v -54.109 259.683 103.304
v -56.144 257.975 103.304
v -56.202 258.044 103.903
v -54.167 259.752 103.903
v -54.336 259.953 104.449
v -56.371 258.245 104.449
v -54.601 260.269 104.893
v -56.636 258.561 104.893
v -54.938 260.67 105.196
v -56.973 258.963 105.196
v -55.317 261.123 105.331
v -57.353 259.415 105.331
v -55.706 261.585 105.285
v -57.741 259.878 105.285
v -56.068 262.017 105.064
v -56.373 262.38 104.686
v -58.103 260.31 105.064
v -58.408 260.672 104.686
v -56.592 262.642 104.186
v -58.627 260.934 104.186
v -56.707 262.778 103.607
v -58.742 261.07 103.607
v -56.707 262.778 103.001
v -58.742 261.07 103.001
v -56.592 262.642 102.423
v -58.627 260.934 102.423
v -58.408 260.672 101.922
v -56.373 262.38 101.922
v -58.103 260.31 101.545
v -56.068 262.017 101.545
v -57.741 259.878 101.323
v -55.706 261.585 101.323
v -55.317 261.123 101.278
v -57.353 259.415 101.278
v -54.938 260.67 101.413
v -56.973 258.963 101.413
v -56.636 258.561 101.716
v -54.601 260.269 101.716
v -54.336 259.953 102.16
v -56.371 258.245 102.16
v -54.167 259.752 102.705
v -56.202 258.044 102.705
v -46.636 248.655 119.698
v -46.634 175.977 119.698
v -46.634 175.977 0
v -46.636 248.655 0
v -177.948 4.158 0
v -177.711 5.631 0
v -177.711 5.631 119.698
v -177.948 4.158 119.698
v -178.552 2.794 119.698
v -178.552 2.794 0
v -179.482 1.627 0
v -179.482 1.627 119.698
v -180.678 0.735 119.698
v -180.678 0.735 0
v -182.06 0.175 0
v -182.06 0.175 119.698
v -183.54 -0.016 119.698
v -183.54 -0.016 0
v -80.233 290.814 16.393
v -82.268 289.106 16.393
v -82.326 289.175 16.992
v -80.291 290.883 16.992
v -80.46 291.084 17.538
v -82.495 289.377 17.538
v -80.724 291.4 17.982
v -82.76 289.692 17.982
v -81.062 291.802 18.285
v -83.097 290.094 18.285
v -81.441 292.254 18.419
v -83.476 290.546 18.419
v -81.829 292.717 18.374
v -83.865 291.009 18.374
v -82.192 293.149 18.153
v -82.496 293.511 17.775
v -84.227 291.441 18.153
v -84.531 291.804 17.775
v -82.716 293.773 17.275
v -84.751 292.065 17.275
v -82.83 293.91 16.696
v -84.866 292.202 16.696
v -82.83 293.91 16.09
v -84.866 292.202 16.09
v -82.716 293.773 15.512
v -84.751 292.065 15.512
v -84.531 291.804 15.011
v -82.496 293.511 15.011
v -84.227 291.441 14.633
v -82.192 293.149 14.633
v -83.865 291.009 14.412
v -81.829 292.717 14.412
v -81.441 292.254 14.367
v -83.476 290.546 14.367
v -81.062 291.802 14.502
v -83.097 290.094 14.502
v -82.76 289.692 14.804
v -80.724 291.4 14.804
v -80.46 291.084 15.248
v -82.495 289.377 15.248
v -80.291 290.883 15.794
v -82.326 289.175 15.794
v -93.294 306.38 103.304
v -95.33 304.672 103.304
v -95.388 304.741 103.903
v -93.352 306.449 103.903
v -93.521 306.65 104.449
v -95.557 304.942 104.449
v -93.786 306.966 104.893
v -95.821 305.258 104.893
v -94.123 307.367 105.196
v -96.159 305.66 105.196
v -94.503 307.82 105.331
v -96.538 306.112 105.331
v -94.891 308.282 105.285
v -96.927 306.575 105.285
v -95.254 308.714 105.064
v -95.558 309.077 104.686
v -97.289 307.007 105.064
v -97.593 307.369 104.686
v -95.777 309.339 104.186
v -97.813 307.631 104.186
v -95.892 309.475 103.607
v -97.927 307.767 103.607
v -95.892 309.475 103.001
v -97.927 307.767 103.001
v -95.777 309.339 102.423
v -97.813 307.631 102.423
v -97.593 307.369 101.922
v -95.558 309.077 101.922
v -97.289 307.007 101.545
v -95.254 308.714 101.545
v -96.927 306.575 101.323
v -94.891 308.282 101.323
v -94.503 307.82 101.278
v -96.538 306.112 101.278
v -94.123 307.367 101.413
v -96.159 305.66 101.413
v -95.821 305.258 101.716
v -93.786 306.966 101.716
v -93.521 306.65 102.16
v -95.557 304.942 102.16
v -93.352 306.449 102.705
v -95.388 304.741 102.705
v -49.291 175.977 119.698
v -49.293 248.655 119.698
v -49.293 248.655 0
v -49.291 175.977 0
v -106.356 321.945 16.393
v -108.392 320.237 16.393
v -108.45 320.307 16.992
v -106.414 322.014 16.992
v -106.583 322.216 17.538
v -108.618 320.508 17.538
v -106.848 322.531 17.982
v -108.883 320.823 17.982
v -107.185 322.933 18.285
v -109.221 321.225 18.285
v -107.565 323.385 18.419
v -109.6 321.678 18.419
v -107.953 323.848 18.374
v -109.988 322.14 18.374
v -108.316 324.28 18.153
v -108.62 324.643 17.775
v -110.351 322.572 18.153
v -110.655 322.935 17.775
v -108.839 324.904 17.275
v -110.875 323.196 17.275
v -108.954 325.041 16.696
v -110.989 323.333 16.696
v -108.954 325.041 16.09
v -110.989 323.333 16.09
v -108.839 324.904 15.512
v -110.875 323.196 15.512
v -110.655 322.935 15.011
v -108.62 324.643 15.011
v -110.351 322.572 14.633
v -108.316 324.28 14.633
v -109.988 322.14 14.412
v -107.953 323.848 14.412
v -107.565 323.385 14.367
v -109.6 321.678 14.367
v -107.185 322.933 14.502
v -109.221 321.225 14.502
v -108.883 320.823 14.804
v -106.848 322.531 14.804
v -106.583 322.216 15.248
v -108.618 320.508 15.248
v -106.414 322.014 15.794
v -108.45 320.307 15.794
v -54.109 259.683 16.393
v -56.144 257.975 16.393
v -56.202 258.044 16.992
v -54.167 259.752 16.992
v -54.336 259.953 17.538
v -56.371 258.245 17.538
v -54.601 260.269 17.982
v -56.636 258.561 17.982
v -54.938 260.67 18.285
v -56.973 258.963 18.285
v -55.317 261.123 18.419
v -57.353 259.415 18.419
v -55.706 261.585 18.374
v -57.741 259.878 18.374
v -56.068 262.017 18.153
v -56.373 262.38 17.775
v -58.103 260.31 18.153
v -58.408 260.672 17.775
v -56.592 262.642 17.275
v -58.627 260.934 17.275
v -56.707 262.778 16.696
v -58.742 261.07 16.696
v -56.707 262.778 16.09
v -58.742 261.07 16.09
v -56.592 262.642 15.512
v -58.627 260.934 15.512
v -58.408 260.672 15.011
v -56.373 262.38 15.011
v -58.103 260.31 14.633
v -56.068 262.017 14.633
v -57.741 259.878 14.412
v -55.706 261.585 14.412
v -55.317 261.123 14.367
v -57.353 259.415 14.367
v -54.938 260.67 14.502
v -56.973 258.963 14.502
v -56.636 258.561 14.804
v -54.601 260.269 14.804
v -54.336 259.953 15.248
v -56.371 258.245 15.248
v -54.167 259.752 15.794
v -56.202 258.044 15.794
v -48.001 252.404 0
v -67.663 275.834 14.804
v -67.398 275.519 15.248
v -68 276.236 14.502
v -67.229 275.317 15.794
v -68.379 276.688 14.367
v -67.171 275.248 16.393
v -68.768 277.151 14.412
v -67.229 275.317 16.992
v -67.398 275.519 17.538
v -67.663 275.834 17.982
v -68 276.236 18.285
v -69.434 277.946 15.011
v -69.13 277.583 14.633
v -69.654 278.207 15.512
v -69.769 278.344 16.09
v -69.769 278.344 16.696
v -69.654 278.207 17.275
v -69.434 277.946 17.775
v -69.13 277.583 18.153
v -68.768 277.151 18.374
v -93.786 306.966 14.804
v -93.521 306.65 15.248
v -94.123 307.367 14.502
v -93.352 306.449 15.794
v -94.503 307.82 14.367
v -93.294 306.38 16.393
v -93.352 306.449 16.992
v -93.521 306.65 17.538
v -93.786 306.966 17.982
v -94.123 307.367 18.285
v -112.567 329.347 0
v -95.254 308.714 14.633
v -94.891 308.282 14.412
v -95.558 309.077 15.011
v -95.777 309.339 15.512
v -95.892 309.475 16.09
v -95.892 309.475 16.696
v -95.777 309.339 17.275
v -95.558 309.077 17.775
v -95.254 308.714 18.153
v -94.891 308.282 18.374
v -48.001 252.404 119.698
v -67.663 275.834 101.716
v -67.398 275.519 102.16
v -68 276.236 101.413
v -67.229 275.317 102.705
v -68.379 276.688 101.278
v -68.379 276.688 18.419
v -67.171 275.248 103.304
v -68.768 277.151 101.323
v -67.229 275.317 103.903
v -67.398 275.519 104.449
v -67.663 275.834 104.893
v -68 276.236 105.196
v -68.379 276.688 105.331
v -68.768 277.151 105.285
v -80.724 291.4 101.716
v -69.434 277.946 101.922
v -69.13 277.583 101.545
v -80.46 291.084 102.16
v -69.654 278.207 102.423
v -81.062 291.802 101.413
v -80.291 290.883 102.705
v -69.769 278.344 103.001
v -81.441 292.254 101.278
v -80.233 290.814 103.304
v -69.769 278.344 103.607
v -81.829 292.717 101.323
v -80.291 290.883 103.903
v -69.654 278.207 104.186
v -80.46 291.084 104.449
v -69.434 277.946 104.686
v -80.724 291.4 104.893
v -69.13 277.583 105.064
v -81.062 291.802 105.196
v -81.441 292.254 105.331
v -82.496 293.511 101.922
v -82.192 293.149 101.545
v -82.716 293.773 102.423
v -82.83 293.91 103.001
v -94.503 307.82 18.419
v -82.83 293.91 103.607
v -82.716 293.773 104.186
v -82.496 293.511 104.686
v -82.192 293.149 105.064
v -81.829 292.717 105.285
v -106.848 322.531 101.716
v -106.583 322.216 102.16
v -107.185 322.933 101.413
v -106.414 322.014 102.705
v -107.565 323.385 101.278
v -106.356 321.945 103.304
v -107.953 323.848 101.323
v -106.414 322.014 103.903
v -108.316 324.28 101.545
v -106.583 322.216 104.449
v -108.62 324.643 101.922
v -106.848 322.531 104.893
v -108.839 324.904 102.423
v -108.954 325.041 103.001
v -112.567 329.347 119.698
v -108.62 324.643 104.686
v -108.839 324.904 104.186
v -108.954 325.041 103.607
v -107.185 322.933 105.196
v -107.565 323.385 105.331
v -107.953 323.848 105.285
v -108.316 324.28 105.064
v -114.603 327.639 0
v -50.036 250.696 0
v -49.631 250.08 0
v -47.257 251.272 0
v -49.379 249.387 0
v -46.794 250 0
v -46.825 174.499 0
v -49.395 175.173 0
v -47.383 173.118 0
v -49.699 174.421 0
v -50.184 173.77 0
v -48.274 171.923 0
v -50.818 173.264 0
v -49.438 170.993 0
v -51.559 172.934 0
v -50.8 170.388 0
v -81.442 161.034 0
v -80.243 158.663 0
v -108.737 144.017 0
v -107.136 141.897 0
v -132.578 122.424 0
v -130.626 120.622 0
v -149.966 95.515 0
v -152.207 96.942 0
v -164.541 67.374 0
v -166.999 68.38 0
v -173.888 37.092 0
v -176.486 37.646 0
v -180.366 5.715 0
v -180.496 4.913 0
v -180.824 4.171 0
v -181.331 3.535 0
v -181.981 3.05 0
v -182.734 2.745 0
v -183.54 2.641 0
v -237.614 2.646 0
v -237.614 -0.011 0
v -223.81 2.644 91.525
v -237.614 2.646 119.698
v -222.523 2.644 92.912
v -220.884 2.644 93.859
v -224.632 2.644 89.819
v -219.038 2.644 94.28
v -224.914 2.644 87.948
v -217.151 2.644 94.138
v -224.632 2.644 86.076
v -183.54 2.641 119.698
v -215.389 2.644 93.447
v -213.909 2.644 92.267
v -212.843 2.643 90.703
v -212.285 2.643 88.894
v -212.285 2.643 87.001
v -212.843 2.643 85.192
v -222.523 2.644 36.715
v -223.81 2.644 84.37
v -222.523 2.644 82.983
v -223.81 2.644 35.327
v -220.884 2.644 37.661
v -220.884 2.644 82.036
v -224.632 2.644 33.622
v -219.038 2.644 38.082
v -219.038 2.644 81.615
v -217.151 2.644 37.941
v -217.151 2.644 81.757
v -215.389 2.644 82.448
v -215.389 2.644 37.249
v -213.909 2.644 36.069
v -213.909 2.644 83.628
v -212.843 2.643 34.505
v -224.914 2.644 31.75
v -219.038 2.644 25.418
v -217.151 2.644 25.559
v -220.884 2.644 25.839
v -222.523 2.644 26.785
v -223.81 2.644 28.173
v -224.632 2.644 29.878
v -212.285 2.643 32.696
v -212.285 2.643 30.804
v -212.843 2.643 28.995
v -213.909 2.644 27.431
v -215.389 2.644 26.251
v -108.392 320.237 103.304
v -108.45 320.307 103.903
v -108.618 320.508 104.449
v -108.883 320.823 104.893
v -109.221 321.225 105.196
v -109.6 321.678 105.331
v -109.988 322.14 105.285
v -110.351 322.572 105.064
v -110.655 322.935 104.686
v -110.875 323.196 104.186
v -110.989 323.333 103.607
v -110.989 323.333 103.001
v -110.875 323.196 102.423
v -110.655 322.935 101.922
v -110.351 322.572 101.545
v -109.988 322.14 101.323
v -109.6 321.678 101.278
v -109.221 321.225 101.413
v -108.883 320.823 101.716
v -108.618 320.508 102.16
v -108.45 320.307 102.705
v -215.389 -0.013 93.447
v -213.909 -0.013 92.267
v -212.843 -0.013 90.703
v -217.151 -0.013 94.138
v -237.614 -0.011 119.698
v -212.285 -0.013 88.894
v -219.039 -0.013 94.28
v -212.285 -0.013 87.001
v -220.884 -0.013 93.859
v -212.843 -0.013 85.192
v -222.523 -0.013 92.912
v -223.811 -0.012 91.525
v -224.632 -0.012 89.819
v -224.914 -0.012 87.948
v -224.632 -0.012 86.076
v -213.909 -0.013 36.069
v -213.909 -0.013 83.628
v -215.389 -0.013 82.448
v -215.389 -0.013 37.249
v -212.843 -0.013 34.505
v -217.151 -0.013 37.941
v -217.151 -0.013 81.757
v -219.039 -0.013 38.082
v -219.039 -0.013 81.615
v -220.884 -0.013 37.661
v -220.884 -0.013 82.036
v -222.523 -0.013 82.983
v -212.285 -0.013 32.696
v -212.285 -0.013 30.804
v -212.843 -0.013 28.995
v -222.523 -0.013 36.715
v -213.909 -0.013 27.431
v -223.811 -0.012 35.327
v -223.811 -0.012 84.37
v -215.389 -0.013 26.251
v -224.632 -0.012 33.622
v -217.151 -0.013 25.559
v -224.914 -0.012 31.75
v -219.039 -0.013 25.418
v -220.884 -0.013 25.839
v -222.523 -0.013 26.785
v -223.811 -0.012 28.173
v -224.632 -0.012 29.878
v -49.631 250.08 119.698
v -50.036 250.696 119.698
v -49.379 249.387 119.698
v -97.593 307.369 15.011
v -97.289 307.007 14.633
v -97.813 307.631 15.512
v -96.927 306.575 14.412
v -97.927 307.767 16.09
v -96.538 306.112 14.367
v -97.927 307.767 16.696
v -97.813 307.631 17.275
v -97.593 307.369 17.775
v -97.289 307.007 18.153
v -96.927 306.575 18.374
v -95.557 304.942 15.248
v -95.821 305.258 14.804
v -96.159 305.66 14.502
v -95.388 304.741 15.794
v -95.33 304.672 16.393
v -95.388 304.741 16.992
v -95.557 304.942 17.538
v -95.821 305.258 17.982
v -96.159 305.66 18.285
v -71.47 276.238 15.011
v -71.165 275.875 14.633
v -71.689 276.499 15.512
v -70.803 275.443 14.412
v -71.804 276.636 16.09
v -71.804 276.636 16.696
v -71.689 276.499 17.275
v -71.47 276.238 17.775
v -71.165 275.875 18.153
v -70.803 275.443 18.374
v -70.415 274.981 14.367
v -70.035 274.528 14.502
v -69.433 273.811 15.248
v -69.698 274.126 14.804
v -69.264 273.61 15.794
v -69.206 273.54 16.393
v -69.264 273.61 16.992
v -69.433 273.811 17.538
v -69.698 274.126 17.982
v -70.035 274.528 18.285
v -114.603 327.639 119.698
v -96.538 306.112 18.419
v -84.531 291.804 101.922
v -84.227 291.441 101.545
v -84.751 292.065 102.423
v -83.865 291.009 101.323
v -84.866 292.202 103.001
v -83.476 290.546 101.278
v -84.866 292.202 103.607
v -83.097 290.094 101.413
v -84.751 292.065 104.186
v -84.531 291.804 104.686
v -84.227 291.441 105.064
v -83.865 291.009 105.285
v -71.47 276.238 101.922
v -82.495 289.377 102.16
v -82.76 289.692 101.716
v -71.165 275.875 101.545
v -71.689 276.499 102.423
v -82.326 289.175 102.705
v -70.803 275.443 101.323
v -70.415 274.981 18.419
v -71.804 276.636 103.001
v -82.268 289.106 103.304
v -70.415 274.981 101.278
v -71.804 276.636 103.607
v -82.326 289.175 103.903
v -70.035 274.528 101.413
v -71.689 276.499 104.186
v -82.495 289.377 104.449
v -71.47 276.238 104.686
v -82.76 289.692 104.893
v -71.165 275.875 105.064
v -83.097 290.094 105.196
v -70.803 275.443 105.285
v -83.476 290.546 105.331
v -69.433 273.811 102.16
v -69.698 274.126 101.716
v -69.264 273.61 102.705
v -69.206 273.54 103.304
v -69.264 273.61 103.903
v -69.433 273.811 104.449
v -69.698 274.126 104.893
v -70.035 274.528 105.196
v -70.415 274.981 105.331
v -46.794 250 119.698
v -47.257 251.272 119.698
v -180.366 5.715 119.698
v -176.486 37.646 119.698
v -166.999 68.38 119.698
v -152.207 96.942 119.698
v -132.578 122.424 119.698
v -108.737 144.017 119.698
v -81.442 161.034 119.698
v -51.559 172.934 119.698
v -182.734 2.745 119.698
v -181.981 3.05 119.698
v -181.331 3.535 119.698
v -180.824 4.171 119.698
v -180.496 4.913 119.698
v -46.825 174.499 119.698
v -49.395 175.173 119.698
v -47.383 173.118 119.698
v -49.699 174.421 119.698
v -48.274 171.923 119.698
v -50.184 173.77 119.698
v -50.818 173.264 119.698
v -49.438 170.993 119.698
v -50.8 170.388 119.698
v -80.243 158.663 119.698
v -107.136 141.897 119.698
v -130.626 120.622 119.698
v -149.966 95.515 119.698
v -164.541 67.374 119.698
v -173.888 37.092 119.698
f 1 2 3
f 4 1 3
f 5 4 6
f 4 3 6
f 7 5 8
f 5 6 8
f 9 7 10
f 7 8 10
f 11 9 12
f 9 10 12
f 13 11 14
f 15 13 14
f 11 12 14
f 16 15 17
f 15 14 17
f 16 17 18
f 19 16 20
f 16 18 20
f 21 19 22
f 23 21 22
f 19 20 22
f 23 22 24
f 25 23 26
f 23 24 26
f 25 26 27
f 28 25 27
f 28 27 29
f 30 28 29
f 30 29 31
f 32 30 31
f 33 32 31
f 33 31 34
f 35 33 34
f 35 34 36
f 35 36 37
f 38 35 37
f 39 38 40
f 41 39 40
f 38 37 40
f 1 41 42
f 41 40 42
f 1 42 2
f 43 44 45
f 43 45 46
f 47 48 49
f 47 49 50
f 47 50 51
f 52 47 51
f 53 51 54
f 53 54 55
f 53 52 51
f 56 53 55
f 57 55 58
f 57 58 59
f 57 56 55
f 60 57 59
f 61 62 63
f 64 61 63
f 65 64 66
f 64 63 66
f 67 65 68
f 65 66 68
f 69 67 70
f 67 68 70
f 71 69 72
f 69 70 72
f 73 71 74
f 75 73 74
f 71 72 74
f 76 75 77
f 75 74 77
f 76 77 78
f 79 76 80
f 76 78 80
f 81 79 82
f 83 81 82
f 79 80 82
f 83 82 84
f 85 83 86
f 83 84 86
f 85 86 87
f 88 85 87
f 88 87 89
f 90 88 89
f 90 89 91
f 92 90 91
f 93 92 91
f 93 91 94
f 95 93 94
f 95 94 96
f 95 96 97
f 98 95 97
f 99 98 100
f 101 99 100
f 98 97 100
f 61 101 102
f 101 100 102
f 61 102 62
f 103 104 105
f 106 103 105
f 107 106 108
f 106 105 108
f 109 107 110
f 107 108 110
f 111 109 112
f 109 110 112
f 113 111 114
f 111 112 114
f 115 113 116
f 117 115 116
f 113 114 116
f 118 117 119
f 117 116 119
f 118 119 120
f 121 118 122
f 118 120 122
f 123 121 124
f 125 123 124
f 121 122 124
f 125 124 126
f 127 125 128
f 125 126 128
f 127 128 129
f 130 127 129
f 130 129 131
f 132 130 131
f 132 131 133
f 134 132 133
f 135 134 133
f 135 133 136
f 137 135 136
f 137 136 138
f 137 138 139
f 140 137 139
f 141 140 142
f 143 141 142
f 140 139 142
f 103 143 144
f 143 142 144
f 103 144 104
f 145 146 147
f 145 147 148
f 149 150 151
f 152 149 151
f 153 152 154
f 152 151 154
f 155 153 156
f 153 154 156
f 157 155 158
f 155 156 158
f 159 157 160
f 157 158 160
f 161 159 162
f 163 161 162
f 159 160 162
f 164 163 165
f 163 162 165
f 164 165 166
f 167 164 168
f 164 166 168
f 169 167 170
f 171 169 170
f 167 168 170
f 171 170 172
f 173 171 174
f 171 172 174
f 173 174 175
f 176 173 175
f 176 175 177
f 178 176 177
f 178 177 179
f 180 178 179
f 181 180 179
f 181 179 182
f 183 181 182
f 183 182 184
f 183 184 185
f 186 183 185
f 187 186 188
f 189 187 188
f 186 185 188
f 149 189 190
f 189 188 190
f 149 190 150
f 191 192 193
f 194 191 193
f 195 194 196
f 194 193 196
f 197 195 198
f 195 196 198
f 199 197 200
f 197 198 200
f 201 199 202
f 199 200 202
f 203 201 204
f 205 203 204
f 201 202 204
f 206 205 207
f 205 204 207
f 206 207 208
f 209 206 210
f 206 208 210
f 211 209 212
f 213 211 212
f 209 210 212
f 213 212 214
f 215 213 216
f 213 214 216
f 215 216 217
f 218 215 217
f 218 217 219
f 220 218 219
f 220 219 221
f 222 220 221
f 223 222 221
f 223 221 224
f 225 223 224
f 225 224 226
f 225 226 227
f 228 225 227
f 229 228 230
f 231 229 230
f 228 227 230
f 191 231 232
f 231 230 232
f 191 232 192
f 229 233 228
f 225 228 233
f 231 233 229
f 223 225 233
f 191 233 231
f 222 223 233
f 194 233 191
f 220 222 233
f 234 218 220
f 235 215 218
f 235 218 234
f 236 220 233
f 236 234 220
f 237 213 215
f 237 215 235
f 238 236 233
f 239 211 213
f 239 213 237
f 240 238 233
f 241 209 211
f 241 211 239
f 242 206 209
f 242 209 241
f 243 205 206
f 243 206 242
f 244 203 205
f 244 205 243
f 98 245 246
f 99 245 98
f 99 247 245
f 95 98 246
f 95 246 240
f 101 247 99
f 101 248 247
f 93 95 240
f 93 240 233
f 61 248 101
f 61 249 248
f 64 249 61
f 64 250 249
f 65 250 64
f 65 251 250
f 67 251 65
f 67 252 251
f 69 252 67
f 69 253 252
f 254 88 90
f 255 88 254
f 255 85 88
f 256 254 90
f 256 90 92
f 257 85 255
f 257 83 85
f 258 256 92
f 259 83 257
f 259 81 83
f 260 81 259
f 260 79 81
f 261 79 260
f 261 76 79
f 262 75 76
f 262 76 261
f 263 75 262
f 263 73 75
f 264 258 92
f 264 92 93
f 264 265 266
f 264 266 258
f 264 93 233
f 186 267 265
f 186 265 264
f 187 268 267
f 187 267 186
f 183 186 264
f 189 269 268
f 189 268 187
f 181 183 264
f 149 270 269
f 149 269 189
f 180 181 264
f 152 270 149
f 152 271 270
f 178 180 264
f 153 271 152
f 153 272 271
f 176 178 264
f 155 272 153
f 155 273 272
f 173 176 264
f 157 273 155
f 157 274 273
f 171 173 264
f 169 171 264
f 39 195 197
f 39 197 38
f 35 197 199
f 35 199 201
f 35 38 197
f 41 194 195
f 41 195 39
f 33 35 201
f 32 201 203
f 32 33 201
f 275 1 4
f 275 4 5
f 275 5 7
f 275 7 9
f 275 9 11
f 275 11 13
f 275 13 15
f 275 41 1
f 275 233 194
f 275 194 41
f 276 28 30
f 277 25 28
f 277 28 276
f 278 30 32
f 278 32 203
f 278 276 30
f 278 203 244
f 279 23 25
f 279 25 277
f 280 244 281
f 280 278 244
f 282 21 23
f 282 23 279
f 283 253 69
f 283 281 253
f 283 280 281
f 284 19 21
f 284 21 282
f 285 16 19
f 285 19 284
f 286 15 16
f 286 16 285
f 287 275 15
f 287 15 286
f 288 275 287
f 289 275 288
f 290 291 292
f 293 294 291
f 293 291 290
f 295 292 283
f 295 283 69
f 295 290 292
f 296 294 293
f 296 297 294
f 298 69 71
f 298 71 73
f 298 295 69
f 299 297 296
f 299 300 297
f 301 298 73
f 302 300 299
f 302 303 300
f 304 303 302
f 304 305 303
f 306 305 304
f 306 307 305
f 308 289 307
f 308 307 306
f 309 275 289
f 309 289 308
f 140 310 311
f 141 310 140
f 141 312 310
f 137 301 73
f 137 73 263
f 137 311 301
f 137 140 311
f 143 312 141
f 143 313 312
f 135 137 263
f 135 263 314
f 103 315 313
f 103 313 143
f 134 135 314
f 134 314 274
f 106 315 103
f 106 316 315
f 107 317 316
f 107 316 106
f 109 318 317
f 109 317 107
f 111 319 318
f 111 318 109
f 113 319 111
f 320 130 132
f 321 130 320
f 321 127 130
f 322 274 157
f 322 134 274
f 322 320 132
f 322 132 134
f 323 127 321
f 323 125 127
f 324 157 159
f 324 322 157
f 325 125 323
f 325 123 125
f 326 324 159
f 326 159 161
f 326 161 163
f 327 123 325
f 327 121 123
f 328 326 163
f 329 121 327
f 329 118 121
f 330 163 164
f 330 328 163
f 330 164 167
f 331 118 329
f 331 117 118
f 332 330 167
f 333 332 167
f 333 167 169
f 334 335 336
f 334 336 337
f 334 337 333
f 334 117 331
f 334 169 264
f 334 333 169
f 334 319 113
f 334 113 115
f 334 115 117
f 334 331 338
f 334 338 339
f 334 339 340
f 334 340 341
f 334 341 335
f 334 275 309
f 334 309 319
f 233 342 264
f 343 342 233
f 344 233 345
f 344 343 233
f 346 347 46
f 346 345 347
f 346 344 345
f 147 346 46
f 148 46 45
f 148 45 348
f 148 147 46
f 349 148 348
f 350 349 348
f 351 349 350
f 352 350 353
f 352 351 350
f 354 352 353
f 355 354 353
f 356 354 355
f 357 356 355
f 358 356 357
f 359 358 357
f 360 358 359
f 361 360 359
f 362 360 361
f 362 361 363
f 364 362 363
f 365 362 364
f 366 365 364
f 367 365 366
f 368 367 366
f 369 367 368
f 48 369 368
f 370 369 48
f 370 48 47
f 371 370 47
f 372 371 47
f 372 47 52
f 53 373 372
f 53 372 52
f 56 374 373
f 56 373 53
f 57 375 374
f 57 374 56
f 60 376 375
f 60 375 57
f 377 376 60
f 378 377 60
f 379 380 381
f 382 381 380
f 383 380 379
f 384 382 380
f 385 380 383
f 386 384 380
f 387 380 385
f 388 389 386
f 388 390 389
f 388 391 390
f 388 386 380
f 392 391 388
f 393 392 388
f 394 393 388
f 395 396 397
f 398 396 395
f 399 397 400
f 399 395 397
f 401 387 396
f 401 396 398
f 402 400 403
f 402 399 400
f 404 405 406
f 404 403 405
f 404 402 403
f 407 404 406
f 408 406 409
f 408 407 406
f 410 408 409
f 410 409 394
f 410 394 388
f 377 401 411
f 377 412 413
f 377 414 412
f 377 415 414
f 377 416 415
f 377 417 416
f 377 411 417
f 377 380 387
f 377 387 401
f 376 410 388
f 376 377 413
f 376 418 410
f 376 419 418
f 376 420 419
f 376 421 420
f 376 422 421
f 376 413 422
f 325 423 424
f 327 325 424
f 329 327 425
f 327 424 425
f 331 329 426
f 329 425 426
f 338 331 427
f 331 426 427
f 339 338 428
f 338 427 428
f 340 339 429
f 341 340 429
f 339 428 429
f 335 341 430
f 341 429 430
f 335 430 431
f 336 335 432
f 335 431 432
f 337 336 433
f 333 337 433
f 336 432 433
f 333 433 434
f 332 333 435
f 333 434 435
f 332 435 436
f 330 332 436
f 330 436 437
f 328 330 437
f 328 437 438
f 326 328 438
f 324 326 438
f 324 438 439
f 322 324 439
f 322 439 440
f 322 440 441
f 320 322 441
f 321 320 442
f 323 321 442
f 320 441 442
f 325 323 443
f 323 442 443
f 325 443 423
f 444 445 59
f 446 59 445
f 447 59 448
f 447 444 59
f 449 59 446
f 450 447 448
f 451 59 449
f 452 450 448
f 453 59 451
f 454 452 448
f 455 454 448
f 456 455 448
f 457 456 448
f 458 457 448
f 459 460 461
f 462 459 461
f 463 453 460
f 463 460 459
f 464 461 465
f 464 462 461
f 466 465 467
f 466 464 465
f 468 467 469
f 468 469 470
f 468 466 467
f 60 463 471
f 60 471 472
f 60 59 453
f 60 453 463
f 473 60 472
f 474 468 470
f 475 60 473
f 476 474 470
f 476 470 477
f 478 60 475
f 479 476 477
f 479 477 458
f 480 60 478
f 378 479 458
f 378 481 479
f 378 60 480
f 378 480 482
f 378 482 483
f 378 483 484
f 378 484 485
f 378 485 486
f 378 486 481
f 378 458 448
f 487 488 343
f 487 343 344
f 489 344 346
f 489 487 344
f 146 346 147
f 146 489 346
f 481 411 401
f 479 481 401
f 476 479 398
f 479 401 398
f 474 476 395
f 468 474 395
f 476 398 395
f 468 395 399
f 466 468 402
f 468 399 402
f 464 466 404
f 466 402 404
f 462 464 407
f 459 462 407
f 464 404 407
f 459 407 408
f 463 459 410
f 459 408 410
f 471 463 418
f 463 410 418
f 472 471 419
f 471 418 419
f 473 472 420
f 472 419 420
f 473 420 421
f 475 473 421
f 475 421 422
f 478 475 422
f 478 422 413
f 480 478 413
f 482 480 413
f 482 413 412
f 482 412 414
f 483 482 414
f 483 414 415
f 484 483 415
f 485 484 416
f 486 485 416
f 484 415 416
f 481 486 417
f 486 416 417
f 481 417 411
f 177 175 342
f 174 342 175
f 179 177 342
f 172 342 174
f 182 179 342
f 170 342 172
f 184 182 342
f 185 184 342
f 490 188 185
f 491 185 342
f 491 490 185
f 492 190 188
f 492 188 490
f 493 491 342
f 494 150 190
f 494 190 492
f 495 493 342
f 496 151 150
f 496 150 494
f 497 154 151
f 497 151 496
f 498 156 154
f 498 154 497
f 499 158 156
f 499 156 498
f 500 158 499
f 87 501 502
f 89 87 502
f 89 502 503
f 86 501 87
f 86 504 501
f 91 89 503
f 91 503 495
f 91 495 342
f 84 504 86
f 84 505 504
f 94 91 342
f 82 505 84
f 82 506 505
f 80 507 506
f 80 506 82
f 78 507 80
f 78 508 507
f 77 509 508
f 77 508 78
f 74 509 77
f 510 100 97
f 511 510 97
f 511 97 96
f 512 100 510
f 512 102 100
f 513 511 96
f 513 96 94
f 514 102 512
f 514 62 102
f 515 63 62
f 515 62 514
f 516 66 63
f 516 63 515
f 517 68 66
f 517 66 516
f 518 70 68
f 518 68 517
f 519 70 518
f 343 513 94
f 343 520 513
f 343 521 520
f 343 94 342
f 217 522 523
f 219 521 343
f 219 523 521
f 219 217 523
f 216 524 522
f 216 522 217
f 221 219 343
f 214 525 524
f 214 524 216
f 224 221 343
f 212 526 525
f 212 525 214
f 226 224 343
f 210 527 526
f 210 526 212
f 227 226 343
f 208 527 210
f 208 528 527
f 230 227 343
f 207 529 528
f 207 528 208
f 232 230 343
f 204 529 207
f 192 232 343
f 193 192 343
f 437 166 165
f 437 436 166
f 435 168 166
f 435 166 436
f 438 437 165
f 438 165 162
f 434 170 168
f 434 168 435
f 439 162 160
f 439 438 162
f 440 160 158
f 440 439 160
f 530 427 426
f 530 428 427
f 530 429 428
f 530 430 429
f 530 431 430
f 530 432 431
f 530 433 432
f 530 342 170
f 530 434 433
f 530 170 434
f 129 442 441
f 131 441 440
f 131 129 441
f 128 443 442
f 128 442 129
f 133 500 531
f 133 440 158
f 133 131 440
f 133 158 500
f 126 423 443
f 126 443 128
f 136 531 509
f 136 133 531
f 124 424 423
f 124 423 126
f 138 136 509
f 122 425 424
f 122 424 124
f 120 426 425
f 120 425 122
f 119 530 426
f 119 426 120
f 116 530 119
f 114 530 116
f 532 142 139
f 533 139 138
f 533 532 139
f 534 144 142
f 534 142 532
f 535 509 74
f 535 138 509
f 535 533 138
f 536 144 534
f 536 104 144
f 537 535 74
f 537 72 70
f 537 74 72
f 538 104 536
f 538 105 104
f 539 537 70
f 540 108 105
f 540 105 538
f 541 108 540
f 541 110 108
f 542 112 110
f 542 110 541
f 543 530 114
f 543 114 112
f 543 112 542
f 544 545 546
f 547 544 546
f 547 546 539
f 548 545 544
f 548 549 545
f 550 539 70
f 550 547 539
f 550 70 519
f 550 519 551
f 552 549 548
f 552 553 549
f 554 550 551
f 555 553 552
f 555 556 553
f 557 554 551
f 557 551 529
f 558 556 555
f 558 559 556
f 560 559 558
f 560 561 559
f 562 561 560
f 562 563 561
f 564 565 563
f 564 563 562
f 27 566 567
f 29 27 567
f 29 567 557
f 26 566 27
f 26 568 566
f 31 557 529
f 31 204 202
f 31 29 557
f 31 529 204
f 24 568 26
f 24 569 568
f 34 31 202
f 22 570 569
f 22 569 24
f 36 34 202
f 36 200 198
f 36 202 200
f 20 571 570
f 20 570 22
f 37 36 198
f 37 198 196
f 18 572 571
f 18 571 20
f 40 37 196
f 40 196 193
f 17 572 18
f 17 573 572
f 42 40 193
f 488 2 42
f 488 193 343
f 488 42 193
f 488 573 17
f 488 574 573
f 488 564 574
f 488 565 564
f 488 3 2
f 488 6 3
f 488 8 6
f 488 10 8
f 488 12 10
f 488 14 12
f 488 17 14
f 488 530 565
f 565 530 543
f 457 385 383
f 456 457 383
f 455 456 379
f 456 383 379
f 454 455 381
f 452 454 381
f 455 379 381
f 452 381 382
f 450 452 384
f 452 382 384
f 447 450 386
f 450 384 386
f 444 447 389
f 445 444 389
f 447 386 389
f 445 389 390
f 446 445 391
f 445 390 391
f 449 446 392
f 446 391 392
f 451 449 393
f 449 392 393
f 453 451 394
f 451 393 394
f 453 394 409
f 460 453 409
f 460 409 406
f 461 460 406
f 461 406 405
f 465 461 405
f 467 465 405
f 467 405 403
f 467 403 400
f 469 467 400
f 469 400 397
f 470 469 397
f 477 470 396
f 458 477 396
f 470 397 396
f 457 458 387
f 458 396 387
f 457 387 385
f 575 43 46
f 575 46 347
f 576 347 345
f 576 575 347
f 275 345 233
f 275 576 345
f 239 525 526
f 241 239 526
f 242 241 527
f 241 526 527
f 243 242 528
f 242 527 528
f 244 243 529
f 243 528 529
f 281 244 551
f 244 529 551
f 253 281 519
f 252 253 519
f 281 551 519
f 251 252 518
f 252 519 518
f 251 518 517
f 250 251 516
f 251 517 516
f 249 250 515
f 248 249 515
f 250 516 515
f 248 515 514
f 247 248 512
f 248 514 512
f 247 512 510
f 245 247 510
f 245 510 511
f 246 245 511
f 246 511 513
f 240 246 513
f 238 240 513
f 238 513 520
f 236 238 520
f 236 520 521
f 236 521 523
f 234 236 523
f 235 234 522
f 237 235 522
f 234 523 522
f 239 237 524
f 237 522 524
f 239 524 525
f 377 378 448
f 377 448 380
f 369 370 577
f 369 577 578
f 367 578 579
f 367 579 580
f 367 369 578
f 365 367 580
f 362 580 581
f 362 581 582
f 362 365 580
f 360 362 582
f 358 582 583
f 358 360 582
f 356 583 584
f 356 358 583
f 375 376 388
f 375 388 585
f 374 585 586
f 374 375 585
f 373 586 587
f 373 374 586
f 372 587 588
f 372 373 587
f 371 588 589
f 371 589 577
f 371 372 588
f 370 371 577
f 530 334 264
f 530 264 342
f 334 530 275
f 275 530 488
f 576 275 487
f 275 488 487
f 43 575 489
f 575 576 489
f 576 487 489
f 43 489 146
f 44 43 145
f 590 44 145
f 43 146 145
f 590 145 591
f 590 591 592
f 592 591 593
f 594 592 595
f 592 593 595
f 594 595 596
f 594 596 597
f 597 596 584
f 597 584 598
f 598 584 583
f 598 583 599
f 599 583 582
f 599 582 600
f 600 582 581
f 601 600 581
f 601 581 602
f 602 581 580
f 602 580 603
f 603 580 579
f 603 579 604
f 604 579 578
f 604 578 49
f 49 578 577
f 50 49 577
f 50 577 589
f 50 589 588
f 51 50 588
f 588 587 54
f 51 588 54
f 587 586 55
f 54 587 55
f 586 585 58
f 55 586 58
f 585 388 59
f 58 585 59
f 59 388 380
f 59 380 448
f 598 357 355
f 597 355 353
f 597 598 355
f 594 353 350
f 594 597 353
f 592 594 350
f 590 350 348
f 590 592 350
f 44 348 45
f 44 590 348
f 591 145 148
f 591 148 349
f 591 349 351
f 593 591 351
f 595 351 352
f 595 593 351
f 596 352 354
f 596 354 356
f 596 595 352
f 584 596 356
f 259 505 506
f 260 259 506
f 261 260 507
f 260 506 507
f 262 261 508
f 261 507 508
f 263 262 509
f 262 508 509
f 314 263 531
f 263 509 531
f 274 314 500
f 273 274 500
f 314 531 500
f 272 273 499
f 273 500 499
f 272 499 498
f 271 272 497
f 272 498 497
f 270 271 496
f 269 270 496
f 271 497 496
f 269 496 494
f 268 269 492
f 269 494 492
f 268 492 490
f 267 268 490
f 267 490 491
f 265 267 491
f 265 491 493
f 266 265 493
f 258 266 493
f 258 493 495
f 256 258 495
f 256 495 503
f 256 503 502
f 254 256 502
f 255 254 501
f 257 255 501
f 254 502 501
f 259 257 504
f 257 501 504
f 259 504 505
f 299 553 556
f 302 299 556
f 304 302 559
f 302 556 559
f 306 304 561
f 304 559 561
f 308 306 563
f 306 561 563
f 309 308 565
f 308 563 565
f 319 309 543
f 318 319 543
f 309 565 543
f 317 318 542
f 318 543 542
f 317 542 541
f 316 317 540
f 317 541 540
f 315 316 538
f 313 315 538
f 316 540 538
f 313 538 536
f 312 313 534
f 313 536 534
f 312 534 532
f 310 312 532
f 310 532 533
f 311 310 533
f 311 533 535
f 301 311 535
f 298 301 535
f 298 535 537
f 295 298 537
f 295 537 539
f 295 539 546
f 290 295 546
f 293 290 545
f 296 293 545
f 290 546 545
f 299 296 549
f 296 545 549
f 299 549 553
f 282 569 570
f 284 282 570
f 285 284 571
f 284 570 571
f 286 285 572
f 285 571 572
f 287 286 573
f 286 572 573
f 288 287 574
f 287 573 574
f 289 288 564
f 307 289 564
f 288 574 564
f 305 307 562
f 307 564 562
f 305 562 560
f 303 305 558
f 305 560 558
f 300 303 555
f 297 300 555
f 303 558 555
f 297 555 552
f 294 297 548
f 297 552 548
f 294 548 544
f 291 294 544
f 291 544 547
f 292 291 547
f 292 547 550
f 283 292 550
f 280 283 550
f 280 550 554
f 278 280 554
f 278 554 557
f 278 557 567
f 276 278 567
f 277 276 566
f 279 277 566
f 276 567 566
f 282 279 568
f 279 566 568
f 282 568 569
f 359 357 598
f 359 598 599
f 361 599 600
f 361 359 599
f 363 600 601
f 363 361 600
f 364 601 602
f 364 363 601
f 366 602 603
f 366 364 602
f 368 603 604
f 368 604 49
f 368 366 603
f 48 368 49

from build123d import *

# Parameters (mm, degrees)
BASE_FLANGE1_DEPTH           = 119.6975
EDGE_FLANGE1_DEPTH           = 119.6975
EDGE_FLANGE2_STRIP_CUT_DEPTH = 119.6975
EDGE_FLANGE2_DEPTH           = 119.6975
EDGE_FLANGE3_DEPTH           = 119.6975
SKETCH20_R                   = 6.35
CUT_EXTRUDE1_DEPTH           = 2.65684
SKETCH21_R                   = 2.032
CUT_EXTRUDE2_DEPTH           = 2.65684


# Sheet-metal steps are written as plain solids
with BuildPart() as part:
    # Sketch1 → Base-Flange1 (new body)
    with BuildSketch(Plane.XY):
        with BuildLine():
            ThreePointArc((-50.8, 170.388379885), (-140.856418383, 108.500273734), (-177.710803869, 5.63118))
            Line((-177.710803869, 5.63118), (-180.366311024, 5.715325918))
            ThreePointArc((-180.366311024, 5.715325918), (-142.961215721, 110.121577824), (-51.559097143, 172.934469105))
            Line((-51.559097143, 172.934469105), (-50.8, 170.388379885))
        make_face()
    extrude(amount=BASE_FLANGE1_DEPTH)

    # Edge-Flange1 section (across the edge) → Edge-Flange1 (add)
    with BuildSketch(Plane(origin=(-49.291175996, 173.610632552, 119.6975), x_dir=(-0.9999999996342678, -2.7045604981568168e-05, 0), z_dir=(0, 0, -1))):
        with BuildLine():
            Line((-2.65684, 2.366572064), (-2.65684, 76.2))
            Line((-2.65684, 76.2), (0, 76.2))
            Line((0, 76.2), (0, 2.366572064))
            ThreePointArc((0, 2.366572064), (0.62936233, 0.469112223), (2.267939433, -0.676102109))
            Line((2.267939433, -0.676102109), (1.508911151, -3.222211858))
            ThreePointArc((1.508911151, -3.222211858), (-1.500827273, -1.118682173), (-2.65684, 2.366572064))
        make_face()
    extrude(amount=EDGE_FLANGE1_DEPTH)

    # Edge-Flange2 strip (across the edge) → Edge-Flange2 strip cut (cut)
    with BuildSketch(Plane(origin=(-49.293236871, 249.810632524, 119.6975), x_dir=(-0.7660270582590358, -0.6428083275868537, 0), z_dir=(0, 0, -1))):
        Polygon((-12.205285278, 10.412383287), (-1.292448625, -2.593029), (0.742808893, -0.885245167), (-10.17002776, 12.12016712), align=None)
    extrude(amount=EDGE_FLANGE2_STRIP_CUT_DEPTH, mode=Mode.SUBTRACT)

    # Edge-Flange2 section (across the edge) → Edge-Flange2 (add)
    with BuildSketch(Plane(origin=(-49.293236871, 249.810632524, 119.6975), x_dir=(-0.7660270582590358, -0.6428083275868537, 0), z_dir=(0, 0, -1))):
        with BuildLine():
            Line((-2.65684, 1.155605494), (-2.65684, 101.6))
            Line((-2.65684, 101.6), (0, 101.6))
            Line((0, 101.6), (0, 1.155605494))
            ThreePointArc((0, 1.155605494), (0.191475929, 0.069691539), (0.742808893, -0.885245167))
            Line((0.742808893, -0.885245167), (-1.292448625, -2.593029))
            ThreePointArc((-1.292448625, -2.593029), (-2.305137014, -0.839001259), (-2.65684, 1.155605494))
        make_face()
    extrude(amount=EDGE_FLANGE2_DEPTH)

    # Edge-Flange3 section (across the edge) → Edge-Flange3 (add)
    with BuildSketch(Plane(origin=(-180.463740314, 2.640617339, 0), x_dir=(8.626632785421055e-05, 0.9999999962790604, 0), z_dir=(0, 0, 1))):
        with BuildLine():
            Line((-2.65684, 3.076251829), (-2.65684, 57.15))
            Line((-2.65684, 57.15), (0, 57.15))
            Line((0, 57.15), (0, 3.076251829))
            ThreePointArc((0, 3.076251829), (0.894756196, 0.86692768), (3.074716973, -0.097164046))
            Line((3.074716973, -0.097164046), (2.990800136, -2.75267845))
            ThreePointArc((2.990800136, -2.75267845), (-1.013351819, -0.981834768), (-2.65684, 3.076251829))
        make_face()
    extrude(amount=EDGE_FLANGE3_DEPTH)

    # Sketch20 → Cut-Extrude1 (cut)
    with BuildSketch(Plane(origin=(0.000226453, 2.625049375, 0), x_dir=(0.9999999962790604, -8.626632785420363e-05, 0), z_dir=(8.626632785420363e-05, 0.9999999962790604, 0))):
        with Locations(Location((-218.563967439, -31.75, 0), (0, 0, 180))):
            Circle(SKETCH20_R)
        with Locations(Location((-218.563967439, -87.9475, 0), (0, 0, 180))):
            Circle(SKETCH20_R)
    extrude(amount=-CUT_EXTRUDE1_DEPTH, mode=Mode.SUBTRACT)

    # Sketch21 → Cut-Extrude2 (cut)
    with BuildSketch(Plane(origin=(94.083750988, 78.949976994, 0), x_dir=(0, 0, 1), z_dir=(-0.7660270582590358, -0.6428083275868537, 0))):
        with Locations(Location((103.30434, 317.017474478, 0), (0, 0, 270))):
            Circle(SKETCH21_R)
        with Locations(Location((103.30434, 296.697474478, 0), (0, 0, 270))):
            Circle(SKETCH21_R)
        with Locations(Location((103.30434, 276.377474478, 0), (0, 0, 270))):
            Circle(SKETCH21_R)
        with Locations(Location((103.30434, 256.057474478, 0), (0, 0, 270))):
            Circle(SKETCH21_R)
        with Locations(Location((103.30434, 235.737474478, 0), (0, 0, 270))):
            Circle(SKETCH21_R)
        with Locations(Location((16.39316, 235.737474478, 0), (0, 0, 270))):
            Circle(SKETCH21_R)
        with Locations(Location((16.39316, 256.057474478, 0), (0, 0, 270))):
            Circle(SKETCH21_R)
        with Locations(Location((16.39316, 276.377474478, 0), (0, 0, 270))):
            Circle(SKETCH21_R)
        with Locations(Location((16.39316, 296.697474478, 0), (0, 0, 270))):
            Circle(SKETCH21_R)
        with Locations(Location((16.39316, 317.017474478, 0), (0, 0, 270))):
            Circle(SKETCH21_R)
    extrude(amount=-CUT_EXTRUDE2_DEPTH, mode=Mode.SUBTRACT)


solid = part.part
